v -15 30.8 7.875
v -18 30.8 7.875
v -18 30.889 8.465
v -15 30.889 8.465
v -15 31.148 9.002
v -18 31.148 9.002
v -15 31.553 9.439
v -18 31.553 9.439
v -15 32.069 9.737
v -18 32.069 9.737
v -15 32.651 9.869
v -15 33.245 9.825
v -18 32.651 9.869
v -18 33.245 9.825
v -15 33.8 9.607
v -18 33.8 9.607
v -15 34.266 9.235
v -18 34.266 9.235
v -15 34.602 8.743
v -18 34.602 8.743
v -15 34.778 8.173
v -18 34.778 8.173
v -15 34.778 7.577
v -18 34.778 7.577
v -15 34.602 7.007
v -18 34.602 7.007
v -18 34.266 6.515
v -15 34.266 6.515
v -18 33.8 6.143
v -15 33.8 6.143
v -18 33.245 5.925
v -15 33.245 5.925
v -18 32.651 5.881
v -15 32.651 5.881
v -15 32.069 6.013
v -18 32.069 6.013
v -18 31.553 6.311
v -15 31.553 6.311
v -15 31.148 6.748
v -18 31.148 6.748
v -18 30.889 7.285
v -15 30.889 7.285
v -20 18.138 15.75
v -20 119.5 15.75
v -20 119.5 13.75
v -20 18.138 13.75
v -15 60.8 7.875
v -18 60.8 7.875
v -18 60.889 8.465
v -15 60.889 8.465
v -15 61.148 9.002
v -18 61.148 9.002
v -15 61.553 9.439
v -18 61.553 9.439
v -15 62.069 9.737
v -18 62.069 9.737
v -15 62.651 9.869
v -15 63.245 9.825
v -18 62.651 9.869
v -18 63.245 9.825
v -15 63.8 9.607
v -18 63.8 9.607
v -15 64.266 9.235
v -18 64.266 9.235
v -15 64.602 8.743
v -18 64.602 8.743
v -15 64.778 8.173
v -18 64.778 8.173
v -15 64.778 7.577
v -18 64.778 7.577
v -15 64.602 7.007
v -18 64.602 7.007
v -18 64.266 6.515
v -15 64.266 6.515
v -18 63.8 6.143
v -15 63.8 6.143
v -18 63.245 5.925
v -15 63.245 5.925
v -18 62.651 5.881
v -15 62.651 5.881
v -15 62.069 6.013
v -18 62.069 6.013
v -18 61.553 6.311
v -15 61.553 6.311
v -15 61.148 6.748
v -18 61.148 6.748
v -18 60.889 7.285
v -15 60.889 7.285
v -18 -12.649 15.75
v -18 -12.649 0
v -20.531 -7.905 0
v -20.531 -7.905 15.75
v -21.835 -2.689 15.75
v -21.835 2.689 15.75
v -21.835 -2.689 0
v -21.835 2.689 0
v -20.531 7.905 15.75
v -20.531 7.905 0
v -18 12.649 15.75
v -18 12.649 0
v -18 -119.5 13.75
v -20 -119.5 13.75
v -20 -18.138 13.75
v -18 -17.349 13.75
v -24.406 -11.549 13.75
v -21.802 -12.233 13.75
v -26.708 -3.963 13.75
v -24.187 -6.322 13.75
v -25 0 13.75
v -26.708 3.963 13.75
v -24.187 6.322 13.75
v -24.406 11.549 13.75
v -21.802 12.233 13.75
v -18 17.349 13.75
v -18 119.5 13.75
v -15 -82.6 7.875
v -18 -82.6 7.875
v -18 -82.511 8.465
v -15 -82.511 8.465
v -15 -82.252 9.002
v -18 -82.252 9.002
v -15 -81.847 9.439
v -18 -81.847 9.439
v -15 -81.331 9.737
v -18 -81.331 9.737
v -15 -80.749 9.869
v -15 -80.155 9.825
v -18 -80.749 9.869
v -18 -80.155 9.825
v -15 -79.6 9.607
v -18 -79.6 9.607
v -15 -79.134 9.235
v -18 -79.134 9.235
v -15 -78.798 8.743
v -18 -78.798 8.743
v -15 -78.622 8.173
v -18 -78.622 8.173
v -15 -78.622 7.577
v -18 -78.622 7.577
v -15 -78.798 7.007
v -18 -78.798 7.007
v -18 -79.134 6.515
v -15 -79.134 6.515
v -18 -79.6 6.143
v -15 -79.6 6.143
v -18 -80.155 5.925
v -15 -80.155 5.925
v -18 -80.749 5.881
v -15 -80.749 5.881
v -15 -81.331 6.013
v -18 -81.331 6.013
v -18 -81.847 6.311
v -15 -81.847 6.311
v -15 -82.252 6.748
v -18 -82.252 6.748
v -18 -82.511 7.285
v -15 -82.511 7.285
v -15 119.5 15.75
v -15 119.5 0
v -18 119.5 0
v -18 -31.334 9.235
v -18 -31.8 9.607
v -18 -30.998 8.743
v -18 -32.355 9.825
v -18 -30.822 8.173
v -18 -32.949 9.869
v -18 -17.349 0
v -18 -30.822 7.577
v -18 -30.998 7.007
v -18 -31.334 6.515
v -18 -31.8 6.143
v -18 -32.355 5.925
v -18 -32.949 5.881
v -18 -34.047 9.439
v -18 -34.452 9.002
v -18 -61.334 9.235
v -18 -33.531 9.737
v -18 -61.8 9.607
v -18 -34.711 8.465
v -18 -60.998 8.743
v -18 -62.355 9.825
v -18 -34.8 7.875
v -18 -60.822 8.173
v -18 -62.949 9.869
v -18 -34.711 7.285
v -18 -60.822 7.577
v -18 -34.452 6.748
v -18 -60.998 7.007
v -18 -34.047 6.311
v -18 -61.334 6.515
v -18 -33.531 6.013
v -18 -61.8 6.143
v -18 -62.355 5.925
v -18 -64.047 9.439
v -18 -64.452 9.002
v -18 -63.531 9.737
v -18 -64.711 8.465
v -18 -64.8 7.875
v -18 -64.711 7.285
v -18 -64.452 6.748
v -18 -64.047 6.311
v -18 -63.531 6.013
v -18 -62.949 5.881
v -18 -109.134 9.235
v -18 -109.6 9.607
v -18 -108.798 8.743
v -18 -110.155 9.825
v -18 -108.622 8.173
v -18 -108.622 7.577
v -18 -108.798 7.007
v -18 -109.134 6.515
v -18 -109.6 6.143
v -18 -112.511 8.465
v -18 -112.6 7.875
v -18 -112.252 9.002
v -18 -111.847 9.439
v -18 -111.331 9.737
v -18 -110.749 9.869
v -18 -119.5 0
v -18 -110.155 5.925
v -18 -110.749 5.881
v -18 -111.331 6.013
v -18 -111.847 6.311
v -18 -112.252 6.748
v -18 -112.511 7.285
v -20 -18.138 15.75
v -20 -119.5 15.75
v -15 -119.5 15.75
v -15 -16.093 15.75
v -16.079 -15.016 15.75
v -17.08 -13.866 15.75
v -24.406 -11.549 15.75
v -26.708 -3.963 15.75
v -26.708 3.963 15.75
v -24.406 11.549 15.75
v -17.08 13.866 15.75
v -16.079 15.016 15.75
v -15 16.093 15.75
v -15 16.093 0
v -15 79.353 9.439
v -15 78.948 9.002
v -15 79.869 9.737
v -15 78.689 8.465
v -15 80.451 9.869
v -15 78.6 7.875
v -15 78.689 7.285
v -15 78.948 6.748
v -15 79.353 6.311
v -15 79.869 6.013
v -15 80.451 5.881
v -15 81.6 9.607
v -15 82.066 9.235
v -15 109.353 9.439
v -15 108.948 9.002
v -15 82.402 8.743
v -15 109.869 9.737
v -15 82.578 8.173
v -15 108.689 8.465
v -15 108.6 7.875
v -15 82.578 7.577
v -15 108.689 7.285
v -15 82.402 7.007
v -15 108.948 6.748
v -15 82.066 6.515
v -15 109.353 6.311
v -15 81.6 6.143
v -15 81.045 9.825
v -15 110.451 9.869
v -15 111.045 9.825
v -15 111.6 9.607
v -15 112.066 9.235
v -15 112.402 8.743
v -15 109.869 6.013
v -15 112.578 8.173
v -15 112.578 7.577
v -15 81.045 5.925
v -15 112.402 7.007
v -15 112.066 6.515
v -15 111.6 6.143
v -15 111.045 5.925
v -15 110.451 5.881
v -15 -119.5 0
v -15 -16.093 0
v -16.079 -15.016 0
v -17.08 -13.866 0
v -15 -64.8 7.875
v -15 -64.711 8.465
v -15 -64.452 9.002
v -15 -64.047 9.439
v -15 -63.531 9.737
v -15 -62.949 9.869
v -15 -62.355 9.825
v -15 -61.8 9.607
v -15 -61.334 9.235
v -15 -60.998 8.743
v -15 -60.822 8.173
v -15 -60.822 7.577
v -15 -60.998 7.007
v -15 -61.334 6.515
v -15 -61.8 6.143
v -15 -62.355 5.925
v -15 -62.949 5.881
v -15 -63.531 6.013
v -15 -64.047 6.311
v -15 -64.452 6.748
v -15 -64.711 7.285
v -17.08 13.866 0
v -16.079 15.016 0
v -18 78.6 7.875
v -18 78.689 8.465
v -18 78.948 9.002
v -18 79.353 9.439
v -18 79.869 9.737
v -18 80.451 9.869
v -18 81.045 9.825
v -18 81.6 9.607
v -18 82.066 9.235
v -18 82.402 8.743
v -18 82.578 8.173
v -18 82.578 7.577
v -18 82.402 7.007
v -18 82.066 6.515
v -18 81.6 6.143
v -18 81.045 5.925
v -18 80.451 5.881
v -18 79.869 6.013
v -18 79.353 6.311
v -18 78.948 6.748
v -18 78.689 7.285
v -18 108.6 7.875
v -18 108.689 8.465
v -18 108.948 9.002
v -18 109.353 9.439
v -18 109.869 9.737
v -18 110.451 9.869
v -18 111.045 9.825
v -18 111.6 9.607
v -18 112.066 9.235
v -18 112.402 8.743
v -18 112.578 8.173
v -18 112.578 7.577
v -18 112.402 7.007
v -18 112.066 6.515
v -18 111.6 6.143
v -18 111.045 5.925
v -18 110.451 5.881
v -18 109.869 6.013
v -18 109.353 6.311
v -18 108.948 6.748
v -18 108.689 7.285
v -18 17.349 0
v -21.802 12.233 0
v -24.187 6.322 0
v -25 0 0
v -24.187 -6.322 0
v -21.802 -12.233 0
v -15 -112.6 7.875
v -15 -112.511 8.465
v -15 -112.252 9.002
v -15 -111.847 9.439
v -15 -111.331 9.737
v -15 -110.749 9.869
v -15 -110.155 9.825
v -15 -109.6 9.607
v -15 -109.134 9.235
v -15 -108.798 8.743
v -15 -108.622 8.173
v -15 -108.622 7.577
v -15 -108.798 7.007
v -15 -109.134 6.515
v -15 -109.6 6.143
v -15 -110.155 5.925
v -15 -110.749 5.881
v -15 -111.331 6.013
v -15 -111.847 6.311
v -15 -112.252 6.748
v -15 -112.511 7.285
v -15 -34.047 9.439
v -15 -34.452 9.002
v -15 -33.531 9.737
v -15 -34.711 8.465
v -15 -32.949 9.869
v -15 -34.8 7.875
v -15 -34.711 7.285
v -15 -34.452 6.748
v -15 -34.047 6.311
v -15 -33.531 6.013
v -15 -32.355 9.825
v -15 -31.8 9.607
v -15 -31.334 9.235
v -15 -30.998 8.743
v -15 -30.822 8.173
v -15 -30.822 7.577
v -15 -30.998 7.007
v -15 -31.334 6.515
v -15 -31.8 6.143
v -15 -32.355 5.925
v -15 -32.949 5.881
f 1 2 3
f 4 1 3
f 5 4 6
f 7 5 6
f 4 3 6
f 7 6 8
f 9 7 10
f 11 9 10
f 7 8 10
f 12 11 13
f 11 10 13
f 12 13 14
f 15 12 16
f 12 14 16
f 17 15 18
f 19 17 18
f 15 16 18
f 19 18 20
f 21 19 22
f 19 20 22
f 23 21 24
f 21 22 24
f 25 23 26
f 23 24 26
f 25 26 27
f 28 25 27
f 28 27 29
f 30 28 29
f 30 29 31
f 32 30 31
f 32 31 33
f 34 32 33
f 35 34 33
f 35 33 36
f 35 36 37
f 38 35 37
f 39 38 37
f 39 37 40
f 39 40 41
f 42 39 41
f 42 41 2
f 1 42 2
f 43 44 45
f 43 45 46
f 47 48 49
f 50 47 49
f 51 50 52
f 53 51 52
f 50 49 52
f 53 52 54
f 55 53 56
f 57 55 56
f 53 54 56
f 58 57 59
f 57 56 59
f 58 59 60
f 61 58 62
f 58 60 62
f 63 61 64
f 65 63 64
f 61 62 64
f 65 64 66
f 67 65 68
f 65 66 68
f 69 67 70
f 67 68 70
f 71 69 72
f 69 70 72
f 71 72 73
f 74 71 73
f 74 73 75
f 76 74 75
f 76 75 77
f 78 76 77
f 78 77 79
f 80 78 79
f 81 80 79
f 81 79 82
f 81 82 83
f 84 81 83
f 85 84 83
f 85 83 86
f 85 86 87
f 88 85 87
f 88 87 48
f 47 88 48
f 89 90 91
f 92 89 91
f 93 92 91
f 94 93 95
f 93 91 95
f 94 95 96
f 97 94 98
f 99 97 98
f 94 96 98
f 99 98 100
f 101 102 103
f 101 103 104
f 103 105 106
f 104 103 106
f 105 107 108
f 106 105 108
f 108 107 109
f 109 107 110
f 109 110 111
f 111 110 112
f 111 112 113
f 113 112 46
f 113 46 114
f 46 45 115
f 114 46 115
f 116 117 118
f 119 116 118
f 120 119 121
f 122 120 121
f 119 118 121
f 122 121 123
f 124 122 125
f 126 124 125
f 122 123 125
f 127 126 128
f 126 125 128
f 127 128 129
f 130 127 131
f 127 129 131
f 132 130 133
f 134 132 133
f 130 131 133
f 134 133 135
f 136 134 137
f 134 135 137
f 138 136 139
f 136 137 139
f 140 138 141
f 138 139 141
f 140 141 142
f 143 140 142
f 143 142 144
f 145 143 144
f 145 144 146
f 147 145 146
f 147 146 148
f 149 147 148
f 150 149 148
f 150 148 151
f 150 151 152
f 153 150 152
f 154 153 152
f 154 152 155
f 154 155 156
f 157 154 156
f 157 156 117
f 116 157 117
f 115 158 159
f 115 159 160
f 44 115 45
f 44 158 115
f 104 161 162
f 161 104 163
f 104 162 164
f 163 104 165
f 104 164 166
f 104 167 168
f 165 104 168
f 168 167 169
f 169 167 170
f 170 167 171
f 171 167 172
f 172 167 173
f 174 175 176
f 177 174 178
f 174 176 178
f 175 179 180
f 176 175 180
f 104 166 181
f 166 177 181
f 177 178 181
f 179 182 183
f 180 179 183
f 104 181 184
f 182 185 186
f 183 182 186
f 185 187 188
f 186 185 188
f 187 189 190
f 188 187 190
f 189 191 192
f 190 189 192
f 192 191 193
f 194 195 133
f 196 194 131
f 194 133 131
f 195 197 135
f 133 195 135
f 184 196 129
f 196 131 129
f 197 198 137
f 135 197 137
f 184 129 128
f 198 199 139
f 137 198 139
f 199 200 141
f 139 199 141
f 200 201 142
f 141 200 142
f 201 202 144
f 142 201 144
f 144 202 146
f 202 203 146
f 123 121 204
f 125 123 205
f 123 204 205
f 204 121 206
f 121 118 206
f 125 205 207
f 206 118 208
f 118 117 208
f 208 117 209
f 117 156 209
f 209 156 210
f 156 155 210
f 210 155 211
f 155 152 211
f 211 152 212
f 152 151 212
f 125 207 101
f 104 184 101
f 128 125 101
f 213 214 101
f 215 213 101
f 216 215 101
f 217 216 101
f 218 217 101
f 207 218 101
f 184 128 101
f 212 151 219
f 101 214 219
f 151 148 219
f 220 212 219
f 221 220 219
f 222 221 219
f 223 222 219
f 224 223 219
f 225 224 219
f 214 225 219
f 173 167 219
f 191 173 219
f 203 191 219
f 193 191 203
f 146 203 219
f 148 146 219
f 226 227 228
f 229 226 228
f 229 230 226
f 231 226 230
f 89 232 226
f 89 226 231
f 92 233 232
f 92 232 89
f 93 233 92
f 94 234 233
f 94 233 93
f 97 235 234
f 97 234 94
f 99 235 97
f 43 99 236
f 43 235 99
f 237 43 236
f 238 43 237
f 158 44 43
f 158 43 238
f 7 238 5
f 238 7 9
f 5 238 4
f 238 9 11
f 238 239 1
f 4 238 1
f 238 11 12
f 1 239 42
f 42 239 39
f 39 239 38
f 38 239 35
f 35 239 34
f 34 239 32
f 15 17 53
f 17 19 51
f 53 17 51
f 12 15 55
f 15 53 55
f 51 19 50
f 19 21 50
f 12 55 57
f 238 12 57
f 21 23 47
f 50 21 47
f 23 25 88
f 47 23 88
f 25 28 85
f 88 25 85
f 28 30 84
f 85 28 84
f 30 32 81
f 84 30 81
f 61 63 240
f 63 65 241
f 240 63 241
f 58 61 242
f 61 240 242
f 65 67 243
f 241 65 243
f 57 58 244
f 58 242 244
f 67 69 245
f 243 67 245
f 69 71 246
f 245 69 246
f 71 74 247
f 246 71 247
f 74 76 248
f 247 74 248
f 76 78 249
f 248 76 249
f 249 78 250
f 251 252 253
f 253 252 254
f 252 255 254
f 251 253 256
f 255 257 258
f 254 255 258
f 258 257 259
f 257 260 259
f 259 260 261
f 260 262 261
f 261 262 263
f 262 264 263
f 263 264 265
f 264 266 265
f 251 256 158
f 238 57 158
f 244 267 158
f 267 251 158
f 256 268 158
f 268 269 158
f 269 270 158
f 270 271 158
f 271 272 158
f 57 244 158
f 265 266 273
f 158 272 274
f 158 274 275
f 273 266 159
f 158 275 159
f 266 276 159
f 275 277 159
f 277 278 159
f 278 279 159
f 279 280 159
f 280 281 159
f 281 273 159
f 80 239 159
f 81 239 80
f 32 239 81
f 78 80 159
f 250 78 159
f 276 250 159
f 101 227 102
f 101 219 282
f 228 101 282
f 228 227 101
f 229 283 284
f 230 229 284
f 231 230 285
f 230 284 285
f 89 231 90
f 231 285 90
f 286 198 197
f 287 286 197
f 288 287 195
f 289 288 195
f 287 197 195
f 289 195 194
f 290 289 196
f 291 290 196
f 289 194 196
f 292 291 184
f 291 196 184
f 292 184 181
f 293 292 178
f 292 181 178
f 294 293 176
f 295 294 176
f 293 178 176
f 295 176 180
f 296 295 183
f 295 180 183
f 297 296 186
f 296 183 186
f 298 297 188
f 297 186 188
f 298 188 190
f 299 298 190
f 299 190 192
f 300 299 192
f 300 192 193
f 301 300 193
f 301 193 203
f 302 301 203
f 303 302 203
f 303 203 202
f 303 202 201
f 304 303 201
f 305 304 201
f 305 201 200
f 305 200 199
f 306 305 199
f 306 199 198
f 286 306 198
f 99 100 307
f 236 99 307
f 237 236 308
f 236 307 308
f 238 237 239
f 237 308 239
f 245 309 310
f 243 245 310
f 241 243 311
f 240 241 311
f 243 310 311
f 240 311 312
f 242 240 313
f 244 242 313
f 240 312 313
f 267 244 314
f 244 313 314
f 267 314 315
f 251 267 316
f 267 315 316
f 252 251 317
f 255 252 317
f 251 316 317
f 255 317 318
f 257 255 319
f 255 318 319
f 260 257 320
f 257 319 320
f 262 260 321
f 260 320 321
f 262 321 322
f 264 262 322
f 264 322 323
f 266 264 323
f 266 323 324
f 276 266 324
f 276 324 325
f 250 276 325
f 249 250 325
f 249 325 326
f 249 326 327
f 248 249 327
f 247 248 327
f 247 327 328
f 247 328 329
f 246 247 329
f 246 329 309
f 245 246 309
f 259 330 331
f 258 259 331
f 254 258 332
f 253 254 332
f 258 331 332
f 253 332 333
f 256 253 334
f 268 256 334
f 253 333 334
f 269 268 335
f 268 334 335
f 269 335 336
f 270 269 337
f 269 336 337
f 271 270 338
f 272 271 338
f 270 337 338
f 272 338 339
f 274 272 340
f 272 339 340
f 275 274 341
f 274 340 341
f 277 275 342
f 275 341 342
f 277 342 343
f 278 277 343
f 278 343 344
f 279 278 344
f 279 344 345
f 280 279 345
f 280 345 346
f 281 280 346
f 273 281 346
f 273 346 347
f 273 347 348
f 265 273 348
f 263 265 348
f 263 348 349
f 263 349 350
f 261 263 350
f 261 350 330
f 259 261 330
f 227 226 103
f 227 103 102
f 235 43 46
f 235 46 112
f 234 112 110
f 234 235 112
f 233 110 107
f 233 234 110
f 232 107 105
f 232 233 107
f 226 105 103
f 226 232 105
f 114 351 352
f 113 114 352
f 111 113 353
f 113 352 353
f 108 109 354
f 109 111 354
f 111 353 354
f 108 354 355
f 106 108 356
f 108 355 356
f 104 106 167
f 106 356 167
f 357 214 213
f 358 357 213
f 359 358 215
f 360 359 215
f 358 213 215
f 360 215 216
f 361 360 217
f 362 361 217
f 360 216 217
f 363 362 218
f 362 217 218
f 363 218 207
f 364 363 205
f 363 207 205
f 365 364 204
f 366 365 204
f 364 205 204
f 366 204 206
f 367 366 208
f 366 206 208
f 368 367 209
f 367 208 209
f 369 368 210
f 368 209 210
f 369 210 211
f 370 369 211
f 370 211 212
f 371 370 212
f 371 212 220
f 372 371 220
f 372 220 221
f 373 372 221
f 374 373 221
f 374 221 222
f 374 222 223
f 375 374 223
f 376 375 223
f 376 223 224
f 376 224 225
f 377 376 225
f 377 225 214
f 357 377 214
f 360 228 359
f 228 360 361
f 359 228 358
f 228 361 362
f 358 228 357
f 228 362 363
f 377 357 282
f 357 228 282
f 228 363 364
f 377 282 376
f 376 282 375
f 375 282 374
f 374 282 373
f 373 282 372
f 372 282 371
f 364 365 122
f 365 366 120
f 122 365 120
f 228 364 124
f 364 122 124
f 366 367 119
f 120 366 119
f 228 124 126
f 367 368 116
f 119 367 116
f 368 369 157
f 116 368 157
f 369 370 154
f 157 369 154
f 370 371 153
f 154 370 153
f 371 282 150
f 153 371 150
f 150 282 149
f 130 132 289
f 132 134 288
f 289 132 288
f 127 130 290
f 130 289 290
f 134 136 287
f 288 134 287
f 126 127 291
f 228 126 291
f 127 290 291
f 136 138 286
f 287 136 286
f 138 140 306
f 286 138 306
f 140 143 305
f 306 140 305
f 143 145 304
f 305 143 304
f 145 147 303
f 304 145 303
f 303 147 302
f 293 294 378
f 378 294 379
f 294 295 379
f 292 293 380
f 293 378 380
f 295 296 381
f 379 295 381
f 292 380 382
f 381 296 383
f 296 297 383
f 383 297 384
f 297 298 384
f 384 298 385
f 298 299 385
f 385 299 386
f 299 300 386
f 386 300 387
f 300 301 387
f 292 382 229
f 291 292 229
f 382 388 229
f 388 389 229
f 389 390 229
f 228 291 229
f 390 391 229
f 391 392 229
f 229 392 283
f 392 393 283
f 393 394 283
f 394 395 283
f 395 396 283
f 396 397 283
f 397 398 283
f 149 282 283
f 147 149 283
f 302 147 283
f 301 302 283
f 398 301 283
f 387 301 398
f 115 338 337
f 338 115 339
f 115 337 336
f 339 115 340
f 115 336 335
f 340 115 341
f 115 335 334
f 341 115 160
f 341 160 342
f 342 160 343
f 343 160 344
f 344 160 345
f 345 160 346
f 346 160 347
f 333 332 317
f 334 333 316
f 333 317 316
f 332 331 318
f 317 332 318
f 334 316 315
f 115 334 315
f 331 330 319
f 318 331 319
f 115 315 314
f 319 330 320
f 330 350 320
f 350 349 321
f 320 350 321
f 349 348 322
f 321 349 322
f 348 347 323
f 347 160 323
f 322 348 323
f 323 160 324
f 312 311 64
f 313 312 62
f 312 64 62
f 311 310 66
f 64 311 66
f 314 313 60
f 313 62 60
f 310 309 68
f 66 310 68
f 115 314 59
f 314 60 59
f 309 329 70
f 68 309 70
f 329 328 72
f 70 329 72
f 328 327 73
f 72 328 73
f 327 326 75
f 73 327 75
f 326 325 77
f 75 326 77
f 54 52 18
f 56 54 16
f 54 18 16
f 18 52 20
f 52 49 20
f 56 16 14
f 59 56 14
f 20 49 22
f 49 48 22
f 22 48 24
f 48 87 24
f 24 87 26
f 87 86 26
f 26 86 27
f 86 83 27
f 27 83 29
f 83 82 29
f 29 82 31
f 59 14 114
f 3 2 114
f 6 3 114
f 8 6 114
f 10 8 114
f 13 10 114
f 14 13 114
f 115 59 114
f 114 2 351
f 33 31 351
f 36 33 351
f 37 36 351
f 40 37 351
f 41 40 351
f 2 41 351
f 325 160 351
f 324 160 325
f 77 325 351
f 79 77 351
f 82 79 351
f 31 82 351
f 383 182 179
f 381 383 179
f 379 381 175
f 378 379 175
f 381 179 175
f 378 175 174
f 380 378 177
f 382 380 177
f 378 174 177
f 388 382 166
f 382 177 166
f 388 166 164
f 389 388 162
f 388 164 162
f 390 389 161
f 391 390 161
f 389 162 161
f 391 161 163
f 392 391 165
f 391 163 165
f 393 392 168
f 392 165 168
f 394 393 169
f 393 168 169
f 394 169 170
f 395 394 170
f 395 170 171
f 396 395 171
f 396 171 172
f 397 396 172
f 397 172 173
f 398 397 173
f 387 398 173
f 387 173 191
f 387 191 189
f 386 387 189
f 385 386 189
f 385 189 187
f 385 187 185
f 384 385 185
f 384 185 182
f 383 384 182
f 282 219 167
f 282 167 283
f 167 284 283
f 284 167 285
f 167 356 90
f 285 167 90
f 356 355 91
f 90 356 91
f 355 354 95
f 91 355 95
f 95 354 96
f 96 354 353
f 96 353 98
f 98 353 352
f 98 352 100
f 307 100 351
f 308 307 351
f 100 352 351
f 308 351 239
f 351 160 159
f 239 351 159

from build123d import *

# Parameters (mm, degrees)
F1_DEPTH = 15.75
F2_R     = 2
F4_DEPTH = 3.001
F3_R     = 2
F5_DEPTH = 3.001
F7_DEPTH = 2


# Not quite as in the source:
# - a feature names something its author has since deleted; it is built from what else it names


with BuildPart() as f1:
    # F0 (on Top) → F1 (new body)
    with BuildSketch(Plane.XY):
        with BuildLine():
            Line((-15, 119.5), (-18, 119.5))
            Line((-18, 119.5), (-18, 17.3493515729))
            ThreePointArc((-18, 17.3493515729), (-25, 0), (-18, -17.3493515729))
            Line((-18, -17.3493515729), (-18, -119.5))
            Line((-18, -119.5), (-15, -119.5))
            Line((-15, -119.5), (-15, -16.0934769394))
            ThreePointArc((-15, -16.0934769394), (-16.5896327506, -14.4493627956), (-18, -12.6491106407))
            ThreePointArc((-18, -12.6491106407), (-22, 0), (-18, 12.6491106407))
            ThreePointArc((-18, 12.6491106407), (-16.5896327506, 14.4493627956), (-15, 16.0934769394))
            Line((-15, 16.0934769394), (-15, 119.5))
        make_face()
    extrude(amount=F1_DEPTH)

    # F2 (on face) → F4 (cut, through all)
    with BuildSketch(Plane(origin=(-18, 0, 0), x_dir=(0, -1, 0), z_dir=(-1, 0, 0))):
        with Locations((-110.6, 7.875)):
            Circle(F2_R)
        with Locations((-80.6, 7.875)):
            Circle(F2_R)
        with Locations((-62.8, 7.875)):
            Circle(F2_R)
        with Locations((-32.8, 7.875)):
            Circle(F2_R)
    extrude(amount=-F4_DEPTH, mode=Mode.SUBTRACT)

    # F3 (on face) → F5 (cut, through all)
    with BuildSketch(Plane(origin=(-18, 0, 0), x_dir=(0, -1, 0), z_dir=(-1, 0, 0))):
        with Locations((32.8, 7.875)):
            Circle(F3_R)
        with Locations((62.8, 7.875)):
            Circle(F3_R)
        with Locations((80.6, 7.875)):
            Circle(F3_R)
        with Locations((110.6, 7.875)):
            Circle(F3_R)
    extrude(amount=-F5_DEPTH, mode=Mode.SUBTRACT)

    # F6 (on face) → F7 (join)
    with BuildSketch(Plane.XY.offset(15.75)):
        with BuildLine():
            ThreePointArc((-20, 18.1383571472), (-27, 0), (-20, -18.1383571472))
            Line((-20, -18.1383571472), (-20, -119.5))
            Line((-20, -119.5), (-18, -119.5))
            Line((-18, -119.5), (-18, -17.3493515729))
            ThreePointArc((-18, -17.3493515729), (-25, 0), (-18, 17.3493515729))
            Line((-18, 17.3493515729), (-18, 119.5))
            Line((-18, 119.5), (-20, 119.5))
            Line((-20, 119.5), (-20, 18.1383571472))
        make_face()
    extrude(amount=-F7_DEPTH)


solid = f1.part
